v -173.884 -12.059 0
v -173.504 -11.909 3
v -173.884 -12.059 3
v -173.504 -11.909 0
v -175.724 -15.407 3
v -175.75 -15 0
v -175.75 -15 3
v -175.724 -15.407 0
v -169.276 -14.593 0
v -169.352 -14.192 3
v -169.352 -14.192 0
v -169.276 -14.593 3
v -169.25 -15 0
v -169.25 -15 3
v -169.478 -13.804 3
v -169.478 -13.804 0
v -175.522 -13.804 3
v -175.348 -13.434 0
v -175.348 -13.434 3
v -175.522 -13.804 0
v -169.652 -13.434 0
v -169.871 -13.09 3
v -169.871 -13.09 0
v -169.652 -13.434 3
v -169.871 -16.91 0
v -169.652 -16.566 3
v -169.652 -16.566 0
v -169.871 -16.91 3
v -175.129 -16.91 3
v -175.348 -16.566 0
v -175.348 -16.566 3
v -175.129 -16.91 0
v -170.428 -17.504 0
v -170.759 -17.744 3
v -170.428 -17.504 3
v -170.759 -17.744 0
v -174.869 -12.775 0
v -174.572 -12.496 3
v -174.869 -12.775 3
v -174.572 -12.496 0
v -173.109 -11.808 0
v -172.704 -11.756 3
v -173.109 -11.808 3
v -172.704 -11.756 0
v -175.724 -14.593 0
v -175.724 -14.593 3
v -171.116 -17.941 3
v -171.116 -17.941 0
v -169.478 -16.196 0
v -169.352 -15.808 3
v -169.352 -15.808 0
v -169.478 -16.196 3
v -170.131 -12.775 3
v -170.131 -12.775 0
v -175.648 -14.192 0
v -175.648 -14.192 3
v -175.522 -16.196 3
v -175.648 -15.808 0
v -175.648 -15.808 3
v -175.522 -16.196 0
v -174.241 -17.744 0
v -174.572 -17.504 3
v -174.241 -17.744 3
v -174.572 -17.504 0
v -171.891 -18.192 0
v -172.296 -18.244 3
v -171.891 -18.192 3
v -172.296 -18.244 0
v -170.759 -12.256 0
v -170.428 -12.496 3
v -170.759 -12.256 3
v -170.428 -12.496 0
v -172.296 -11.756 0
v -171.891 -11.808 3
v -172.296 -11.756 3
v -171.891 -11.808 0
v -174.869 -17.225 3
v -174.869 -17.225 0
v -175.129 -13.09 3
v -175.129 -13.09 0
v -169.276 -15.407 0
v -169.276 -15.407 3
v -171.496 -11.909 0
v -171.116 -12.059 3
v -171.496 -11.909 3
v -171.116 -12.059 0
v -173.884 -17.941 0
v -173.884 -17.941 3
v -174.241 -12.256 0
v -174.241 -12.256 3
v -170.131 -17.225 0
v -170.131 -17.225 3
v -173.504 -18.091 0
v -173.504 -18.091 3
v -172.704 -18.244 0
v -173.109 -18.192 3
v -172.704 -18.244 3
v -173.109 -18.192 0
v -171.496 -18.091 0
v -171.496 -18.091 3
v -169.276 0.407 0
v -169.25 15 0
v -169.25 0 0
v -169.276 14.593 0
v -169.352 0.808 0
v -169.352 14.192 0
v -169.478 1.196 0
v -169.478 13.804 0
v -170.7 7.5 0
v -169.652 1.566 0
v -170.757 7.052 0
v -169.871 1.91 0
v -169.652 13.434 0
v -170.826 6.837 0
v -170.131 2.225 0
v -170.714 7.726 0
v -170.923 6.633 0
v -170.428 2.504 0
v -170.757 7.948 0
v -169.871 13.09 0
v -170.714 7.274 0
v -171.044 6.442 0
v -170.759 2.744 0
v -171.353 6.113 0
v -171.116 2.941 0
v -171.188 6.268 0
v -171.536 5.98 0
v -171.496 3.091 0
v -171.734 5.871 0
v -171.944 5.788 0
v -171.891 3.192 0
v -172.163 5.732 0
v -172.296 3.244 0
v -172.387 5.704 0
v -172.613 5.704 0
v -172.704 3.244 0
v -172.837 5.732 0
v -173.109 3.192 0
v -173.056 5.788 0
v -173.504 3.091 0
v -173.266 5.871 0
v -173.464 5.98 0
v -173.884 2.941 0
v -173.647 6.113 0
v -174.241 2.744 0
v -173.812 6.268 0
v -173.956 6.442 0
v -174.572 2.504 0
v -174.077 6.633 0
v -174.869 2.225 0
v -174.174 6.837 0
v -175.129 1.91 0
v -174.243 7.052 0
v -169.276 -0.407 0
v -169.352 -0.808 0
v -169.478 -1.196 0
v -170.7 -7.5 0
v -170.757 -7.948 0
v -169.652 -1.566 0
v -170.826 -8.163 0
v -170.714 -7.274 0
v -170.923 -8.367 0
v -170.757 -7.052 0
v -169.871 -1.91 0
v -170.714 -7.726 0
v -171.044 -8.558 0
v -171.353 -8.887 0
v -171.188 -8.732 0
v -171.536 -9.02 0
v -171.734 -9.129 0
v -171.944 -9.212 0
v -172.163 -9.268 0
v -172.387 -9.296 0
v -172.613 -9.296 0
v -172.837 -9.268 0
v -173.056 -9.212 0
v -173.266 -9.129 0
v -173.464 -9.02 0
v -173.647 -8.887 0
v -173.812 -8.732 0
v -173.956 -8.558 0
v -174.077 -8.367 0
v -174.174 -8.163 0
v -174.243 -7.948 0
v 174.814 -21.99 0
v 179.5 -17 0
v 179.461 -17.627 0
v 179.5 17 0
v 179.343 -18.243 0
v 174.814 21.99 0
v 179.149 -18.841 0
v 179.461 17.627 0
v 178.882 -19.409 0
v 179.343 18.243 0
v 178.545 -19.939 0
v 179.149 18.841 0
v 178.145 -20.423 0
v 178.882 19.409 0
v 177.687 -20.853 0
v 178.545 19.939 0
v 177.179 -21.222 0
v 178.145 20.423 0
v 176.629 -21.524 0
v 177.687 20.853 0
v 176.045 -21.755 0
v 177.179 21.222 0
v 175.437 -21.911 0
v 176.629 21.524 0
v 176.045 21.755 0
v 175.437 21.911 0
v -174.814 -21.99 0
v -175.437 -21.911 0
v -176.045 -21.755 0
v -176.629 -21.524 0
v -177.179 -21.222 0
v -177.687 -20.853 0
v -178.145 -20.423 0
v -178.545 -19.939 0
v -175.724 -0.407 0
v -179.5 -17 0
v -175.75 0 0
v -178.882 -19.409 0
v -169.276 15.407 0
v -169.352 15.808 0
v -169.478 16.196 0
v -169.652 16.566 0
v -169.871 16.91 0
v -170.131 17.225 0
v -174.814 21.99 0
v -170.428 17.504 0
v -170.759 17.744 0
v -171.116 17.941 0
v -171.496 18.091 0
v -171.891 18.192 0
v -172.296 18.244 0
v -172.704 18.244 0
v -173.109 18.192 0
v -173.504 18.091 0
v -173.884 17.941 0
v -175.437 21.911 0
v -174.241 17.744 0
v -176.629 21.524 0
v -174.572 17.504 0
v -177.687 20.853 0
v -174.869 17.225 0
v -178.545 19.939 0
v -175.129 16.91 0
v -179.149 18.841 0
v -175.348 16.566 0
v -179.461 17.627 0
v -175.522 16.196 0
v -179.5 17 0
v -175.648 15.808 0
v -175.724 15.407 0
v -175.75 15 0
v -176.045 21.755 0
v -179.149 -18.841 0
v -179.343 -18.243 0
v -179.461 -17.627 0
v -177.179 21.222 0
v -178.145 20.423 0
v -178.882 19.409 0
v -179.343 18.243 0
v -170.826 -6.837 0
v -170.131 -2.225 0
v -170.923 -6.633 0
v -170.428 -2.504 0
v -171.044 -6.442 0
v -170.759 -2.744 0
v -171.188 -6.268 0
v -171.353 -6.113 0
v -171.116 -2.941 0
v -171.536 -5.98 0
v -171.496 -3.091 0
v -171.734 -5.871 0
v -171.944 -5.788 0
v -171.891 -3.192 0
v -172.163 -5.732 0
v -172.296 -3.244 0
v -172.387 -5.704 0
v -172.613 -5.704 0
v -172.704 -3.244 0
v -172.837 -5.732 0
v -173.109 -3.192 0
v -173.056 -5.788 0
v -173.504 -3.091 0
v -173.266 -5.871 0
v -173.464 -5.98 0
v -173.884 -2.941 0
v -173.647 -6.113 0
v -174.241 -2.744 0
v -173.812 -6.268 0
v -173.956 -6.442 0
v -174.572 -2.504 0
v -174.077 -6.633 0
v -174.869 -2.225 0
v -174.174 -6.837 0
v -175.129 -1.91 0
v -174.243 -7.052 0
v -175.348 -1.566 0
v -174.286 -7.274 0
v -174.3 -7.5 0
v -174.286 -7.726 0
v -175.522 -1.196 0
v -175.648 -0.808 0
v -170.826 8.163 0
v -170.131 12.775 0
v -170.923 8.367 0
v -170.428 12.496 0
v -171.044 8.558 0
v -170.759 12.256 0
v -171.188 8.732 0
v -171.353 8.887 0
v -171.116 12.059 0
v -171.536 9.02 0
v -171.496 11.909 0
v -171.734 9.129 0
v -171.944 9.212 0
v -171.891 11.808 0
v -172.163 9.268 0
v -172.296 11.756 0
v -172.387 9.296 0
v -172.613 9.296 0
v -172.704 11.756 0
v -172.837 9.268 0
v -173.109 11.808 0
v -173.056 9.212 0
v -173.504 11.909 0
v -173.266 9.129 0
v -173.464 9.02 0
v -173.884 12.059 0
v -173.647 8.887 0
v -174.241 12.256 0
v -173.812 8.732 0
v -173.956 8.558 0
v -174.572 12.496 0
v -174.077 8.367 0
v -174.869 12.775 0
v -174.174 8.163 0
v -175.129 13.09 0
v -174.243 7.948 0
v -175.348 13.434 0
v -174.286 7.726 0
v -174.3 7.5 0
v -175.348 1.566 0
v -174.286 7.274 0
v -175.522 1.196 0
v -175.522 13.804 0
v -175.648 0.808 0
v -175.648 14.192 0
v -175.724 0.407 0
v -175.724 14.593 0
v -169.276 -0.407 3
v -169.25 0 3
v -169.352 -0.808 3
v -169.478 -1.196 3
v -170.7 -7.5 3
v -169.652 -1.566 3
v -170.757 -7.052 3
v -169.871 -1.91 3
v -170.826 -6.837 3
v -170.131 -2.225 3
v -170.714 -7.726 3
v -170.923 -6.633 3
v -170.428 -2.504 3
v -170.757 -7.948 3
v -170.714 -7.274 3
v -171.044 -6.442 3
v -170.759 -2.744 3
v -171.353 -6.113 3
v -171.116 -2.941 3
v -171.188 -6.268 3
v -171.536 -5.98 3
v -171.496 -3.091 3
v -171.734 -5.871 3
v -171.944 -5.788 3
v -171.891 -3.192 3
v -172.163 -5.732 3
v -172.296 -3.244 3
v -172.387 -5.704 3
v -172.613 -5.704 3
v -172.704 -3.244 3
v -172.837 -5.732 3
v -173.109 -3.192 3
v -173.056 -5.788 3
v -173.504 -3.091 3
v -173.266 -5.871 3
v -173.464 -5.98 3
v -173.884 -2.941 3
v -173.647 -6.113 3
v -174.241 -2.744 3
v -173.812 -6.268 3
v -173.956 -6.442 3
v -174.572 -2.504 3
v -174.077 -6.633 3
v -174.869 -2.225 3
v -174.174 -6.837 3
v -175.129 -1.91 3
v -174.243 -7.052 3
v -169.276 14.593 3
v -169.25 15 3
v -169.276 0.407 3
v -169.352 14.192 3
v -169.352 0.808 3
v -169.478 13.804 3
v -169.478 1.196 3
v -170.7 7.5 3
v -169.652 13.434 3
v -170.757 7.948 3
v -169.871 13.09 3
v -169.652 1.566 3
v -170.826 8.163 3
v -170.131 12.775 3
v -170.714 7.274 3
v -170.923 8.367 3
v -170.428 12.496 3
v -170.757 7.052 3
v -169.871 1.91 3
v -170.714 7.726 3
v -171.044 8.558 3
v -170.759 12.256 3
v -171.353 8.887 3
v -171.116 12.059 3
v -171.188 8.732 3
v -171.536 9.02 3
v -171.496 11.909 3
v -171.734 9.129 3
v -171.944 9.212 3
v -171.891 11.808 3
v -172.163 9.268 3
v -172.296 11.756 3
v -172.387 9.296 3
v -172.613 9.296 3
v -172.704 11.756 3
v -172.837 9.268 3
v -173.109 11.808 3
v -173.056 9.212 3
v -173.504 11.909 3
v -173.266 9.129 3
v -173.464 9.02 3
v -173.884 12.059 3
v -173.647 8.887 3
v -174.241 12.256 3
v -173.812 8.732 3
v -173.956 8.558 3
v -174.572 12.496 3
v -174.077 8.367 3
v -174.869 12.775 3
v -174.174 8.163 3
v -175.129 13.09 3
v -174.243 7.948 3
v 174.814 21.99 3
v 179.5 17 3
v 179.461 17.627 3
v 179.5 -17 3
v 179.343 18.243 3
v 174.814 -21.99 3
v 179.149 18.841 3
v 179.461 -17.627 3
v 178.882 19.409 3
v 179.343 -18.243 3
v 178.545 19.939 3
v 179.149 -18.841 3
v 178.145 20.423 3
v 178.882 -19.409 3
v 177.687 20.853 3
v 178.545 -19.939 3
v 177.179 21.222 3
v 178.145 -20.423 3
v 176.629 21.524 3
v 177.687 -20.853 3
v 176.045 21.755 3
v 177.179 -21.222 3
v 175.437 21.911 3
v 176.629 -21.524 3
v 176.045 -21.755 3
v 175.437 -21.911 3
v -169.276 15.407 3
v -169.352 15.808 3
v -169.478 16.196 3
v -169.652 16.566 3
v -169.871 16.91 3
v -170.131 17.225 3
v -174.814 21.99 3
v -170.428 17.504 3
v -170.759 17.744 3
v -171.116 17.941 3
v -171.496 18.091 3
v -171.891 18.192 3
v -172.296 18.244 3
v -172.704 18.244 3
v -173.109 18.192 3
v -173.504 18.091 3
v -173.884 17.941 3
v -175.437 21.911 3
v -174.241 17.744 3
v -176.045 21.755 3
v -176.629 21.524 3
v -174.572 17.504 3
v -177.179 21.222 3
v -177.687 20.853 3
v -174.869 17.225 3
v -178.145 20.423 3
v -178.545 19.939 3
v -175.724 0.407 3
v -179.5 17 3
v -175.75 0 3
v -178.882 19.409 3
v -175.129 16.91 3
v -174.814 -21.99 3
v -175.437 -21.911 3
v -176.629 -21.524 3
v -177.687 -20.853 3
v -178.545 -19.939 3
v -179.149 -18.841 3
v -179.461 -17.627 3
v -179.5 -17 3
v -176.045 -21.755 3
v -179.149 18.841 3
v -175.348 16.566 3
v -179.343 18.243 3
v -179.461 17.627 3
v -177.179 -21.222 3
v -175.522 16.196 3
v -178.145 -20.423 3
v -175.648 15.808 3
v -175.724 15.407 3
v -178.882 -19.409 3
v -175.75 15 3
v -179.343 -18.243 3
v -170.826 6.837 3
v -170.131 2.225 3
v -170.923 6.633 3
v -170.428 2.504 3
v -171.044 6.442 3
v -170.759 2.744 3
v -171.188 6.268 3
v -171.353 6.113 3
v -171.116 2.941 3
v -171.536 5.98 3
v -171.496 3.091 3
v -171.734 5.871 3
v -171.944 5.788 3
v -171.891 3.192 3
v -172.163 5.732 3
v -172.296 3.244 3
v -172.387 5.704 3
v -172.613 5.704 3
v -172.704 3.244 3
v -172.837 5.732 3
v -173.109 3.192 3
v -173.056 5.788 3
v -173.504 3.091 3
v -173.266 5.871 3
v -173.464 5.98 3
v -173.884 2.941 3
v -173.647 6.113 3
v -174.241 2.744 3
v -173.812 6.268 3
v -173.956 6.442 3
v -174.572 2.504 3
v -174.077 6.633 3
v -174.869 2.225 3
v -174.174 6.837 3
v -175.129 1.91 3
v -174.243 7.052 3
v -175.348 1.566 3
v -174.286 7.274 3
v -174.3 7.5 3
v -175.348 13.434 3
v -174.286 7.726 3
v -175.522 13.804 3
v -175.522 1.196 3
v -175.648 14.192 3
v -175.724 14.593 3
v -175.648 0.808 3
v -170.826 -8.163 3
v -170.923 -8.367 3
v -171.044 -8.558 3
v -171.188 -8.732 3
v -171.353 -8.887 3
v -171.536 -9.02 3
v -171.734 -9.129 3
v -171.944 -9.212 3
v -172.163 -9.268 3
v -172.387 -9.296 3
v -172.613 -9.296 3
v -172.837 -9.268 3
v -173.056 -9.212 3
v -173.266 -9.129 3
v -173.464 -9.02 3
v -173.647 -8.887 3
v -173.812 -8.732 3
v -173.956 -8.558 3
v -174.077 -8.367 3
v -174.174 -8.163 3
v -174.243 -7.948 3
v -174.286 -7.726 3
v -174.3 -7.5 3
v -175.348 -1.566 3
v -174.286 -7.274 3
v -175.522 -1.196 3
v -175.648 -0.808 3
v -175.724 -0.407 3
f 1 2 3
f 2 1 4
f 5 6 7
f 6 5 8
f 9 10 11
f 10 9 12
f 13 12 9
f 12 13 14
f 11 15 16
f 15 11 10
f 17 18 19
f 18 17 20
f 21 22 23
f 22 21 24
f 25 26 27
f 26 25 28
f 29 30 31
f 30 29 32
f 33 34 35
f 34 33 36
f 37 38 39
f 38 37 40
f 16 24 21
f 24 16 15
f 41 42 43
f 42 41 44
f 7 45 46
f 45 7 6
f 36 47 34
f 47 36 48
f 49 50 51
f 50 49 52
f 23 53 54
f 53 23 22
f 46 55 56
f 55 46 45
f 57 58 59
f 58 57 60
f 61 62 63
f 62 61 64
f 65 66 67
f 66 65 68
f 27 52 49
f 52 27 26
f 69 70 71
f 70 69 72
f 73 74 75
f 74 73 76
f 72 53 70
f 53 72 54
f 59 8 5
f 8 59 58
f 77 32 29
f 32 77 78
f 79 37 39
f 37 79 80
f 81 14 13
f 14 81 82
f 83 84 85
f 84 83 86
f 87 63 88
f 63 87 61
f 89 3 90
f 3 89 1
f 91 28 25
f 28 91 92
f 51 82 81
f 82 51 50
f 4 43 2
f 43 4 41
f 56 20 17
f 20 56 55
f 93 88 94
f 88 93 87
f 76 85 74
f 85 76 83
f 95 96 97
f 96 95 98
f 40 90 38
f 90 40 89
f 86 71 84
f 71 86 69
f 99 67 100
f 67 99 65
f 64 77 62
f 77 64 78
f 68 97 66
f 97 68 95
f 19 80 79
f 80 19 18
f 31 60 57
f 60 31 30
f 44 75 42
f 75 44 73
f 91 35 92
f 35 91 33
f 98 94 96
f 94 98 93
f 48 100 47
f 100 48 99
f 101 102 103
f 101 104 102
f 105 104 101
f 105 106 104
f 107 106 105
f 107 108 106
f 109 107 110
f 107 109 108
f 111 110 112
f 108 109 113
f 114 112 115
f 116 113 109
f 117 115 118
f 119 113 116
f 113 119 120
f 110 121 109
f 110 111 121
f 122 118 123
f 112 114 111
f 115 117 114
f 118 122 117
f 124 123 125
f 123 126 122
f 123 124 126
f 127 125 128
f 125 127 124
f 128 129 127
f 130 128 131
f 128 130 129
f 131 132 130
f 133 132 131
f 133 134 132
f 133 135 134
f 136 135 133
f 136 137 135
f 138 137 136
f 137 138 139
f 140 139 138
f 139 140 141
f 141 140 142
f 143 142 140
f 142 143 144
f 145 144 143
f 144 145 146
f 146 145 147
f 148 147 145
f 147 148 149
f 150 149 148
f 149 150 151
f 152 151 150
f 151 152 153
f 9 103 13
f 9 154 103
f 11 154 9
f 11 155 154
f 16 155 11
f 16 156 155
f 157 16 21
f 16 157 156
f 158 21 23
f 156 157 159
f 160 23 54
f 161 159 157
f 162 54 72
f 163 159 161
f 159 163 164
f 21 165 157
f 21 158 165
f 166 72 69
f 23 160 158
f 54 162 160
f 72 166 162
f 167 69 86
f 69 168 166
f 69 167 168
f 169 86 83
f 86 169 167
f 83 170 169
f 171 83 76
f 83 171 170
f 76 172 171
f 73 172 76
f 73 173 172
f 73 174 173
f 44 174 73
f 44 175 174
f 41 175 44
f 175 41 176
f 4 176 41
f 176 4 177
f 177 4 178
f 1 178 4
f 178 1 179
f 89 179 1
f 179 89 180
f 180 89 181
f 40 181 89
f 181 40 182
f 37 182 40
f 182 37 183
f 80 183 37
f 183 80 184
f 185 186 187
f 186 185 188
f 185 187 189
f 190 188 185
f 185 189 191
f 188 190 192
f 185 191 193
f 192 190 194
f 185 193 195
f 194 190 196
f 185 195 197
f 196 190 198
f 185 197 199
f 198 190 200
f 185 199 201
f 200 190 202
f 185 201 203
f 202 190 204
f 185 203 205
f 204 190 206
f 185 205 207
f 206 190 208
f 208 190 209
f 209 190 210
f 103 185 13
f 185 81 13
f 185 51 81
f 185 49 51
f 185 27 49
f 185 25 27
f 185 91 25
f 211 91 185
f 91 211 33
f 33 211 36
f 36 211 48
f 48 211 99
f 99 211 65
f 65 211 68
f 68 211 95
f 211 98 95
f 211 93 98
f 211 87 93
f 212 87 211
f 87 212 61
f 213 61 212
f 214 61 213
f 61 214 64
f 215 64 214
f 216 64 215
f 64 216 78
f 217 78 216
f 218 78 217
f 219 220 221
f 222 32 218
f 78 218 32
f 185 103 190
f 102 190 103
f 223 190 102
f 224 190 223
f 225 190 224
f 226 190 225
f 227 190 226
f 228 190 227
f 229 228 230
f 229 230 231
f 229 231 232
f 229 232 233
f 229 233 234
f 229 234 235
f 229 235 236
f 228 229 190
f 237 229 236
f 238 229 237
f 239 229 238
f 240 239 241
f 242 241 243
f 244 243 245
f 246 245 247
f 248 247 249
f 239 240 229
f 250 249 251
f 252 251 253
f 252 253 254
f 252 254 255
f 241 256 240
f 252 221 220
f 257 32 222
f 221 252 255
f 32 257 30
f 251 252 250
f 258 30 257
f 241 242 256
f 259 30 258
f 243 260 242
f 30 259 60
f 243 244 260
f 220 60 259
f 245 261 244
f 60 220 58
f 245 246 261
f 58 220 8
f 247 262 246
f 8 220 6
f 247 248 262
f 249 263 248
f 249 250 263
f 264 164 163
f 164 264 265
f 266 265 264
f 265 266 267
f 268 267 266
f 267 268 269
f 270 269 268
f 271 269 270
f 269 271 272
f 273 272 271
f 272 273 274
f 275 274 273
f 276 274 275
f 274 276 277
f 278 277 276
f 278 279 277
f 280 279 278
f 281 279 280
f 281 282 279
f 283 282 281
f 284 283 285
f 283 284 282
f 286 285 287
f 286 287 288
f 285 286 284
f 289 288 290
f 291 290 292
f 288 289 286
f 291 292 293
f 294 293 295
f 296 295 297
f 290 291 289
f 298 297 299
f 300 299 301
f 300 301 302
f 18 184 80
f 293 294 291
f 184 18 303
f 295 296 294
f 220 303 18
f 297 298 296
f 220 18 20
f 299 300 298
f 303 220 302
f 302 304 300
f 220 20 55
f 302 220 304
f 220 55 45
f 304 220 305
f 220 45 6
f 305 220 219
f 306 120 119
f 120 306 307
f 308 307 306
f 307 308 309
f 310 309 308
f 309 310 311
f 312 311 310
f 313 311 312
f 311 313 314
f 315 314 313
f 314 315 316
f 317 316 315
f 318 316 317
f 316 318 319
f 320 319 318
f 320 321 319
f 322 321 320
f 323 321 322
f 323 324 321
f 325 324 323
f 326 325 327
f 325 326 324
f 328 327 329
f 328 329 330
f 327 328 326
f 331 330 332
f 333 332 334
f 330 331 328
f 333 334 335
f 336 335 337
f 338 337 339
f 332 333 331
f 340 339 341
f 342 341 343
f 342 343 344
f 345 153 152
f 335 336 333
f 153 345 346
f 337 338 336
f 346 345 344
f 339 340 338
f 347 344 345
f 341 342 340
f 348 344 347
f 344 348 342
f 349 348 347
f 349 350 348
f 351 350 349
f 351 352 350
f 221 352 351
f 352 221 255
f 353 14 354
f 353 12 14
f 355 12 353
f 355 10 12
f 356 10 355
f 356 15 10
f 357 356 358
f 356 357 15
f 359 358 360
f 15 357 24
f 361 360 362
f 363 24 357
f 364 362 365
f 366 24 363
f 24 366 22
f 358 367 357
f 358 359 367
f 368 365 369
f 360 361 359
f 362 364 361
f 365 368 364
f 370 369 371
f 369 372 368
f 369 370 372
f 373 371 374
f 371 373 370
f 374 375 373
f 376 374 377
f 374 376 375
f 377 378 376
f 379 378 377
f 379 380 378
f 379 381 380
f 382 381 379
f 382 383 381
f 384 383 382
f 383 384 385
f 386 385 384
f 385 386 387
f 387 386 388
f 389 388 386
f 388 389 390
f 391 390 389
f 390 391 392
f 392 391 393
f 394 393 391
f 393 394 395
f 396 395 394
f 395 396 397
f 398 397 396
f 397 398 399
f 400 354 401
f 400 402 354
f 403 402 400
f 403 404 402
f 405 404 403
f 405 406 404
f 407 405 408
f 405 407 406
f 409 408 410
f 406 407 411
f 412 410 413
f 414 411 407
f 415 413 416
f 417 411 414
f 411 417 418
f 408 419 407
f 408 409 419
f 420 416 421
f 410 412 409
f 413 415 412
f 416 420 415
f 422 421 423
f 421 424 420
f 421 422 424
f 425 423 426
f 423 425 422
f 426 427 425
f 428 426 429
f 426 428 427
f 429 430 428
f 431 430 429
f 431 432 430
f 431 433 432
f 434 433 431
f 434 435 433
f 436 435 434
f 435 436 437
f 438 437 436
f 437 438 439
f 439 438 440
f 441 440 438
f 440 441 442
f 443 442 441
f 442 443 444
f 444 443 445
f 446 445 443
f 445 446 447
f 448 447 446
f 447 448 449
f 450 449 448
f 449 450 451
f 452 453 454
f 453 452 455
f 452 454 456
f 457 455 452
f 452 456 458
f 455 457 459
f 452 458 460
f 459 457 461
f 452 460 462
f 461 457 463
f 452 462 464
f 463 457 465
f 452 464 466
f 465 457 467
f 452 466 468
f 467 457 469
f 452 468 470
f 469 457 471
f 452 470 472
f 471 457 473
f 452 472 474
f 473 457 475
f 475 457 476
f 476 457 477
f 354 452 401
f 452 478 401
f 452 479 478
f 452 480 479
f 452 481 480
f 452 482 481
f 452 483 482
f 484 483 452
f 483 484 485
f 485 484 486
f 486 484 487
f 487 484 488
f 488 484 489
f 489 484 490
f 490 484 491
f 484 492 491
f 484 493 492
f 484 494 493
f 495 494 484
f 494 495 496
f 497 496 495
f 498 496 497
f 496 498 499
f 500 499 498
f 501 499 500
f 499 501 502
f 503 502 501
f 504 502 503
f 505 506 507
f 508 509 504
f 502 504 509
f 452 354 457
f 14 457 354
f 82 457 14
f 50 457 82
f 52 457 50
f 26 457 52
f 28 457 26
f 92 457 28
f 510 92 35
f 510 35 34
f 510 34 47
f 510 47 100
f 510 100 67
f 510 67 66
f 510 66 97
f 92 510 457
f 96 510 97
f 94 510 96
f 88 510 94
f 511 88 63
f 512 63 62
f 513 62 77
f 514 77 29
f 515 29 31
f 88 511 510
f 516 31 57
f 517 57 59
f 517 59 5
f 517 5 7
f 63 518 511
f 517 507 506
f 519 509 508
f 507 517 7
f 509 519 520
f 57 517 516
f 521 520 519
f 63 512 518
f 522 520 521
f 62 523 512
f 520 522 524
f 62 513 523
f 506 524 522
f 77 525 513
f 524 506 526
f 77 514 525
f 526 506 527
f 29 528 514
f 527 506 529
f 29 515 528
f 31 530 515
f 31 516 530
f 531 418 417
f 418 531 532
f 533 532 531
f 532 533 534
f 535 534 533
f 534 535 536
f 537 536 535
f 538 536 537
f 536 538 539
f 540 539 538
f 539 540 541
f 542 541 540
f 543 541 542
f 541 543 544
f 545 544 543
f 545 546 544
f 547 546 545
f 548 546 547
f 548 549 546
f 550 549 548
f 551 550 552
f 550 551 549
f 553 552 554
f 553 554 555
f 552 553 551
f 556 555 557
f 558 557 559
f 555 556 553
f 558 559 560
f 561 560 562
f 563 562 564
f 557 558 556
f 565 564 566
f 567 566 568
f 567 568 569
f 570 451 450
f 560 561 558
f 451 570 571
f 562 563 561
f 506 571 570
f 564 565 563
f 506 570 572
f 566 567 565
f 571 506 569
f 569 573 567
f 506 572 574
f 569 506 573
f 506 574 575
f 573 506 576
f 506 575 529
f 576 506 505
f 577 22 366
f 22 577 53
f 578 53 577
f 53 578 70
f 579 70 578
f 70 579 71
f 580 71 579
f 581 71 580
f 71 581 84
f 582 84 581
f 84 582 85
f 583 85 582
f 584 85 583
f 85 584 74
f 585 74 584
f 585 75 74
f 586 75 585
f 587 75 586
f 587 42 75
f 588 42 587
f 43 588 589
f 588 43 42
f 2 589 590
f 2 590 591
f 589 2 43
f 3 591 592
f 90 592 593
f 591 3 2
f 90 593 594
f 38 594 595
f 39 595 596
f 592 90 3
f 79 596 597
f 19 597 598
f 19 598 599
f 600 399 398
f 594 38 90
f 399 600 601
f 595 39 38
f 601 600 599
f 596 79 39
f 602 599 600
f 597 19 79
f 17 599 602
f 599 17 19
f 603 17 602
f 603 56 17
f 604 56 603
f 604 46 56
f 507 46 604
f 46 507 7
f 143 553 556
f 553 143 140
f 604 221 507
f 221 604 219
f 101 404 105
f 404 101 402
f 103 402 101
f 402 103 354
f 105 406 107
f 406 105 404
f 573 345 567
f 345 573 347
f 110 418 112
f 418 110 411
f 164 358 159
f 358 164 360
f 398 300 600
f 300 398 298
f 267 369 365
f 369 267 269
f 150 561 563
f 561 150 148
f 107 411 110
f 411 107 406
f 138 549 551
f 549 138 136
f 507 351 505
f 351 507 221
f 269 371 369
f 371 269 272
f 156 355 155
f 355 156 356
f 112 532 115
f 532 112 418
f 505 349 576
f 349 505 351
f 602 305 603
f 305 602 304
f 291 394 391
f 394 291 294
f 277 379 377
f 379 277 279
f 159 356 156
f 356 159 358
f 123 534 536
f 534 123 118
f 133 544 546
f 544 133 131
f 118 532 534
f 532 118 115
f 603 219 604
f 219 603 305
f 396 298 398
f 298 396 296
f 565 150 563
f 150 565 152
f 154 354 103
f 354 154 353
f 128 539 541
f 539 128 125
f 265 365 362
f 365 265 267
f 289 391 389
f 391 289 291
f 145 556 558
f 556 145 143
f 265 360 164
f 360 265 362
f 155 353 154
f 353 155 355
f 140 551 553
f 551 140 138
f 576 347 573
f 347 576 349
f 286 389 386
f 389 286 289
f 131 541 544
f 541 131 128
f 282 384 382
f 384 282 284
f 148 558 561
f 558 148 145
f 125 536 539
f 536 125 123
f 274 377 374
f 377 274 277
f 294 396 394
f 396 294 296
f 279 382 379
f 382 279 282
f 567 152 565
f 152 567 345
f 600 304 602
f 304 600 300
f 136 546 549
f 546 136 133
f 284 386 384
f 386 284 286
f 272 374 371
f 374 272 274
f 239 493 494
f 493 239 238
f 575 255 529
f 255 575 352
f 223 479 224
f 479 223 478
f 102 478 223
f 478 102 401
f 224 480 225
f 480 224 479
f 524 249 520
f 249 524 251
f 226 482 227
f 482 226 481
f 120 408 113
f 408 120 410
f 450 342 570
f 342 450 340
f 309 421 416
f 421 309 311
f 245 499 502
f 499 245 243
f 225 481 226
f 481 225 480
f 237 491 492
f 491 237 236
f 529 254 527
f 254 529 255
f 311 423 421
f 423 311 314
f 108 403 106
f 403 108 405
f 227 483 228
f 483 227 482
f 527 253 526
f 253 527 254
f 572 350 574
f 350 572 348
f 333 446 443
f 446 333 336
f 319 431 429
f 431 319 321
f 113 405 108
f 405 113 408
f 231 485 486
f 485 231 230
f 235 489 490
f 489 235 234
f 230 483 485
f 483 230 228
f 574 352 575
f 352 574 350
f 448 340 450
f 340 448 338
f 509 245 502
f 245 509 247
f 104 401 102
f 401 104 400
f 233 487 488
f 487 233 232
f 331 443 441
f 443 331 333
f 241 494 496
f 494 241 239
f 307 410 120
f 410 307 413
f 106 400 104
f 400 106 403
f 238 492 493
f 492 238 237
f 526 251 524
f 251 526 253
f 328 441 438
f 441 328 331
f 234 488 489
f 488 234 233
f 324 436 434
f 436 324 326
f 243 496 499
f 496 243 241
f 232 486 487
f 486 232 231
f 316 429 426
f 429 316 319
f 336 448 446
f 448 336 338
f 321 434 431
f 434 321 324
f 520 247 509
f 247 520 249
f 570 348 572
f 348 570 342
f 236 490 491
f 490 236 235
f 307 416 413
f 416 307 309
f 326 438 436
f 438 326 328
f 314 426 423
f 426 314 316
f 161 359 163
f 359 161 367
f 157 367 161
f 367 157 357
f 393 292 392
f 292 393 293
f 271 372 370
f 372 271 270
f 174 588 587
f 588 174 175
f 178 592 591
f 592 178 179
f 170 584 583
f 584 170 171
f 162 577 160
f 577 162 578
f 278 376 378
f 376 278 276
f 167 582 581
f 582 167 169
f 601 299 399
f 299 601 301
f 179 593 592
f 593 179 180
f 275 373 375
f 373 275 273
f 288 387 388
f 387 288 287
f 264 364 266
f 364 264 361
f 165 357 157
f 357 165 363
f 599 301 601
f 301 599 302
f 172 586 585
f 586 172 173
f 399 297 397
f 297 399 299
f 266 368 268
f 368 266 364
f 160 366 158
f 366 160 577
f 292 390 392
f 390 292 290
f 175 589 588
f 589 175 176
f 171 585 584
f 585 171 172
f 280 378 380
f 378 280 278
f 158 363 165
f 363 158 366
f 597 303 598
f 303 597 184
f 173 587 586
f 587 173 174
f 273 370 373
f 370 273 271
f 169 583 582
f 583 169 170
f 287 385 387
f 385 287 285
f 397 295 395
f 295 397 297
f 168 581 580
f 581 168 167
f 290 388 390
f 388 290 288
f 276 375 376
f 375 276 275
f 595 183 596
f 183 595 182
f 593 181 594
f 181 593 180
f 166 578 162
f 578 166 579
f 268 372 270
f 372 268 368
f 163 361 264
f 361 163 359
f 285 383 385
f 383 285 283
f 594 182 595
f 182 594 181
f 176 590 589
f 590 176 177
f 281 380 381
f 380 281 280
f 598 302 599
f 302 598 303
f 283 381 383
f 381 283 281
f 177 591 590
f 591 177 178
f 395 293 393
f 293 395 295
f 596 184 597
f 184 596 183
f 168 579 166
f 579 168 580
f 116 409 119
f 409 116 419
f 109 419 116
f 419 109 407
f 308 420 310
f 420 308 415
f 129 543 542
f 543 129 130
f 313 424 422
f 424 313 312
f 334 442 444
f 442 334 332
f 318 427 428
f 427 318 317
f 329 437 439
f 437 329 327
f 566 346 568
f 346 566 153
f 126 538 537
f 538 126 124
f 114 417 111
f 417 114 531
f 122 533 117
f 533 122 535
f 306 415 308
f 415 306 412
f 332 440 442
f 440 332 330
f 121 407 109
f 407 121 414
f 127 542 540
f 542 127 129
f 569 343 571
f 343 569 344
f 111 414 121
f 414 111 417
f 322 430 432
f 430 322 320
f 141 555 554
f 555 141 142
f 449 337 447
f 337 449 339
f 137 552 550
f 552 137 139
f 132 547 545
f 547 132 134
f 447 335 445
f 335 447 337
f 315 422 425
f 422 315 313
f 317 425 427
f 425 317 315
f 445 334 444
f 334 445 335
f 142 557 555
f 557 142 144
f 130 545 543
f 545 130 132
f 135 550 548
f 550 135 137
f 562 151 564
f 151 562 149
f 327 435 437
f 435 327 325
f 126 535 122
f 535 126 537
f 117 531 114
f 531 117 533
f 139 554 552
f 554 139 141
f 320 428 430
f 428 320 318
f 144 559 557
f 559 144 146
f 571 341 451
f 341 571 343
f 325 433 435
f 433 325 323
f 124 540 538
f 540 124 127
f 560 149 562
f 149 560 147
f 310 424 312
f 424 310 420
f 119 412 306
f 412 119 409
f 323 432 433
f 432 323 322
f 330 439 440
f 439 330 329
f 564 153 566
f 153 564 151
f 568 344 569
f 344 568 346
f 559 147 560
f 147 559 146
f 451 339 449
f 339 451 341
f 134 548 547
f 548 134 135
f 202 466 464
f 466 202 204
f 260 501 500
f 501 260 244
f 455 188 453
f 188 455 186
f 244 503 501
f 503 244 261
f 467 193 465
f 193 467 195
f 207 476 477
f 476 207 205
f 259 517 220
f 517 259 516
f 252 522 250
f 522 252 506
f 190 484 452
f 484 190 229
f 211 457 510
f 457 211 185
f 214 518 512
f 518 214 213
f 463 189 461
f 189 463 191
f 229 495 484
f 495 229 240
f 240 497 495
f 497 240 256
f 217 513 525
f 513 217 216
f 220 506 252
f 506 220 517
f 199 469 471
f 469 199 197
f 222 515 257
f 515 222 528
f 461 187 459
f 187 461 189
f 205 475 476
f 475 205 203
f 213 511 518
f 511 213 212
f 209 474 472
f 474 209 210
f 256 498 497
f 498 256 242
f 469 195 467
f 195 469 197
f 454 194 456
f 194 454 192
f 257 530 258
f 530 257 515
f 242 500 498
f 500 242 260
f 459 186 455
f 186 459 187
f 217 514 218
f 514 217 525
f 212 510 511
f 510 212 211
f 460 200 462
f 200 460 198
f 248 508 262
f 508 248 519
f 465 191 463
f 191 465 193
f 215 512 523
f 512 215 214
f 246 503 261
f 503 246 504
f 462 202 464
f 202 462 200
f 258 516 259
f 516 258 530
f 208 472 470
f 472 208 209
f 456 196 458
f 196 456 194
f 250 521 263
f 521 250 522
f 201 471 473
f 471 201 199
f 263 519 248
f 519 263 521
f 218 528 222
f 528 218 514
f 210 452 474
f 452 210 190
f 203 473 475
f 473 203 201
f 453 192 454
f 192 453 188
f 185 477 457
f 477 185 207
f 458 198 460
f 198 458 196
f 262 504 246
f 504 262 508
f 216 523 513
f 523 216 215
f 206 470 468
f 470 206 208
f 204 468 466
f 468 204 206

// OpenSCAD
$fn = 50;


difference() {
	union() {
		hull() {
			translate(v = [-174.5000000000, 17.0000000000, 0]) {
				cylinder(h = 3, r = 5);
			}
			translate(v = [174.5000000000, 17.0000000000, 0]) {
				cylinder(h = 3, r = 5);
			}
			translate(v = [-174.5000000000, -17.0000000000, 0]) {
				cylinder(h = 3, r = 5);
			}
			translate(v = [174.5000000000, -17.0000000000, 0]) {
				cylinder(h = 3, r = 5);
			}
		}
	}
	union() {
		translate(v = [-172.5000000000, -15.0000000000, 0]) {
			cylinder(h = 3, r = 3.2500000000);
		}
		translate(v = [-172.5000000000, 0.0000000000, 0]) {
			cylinder(h = 3, r = 3.2500000000);
		}
		translate(v = [-172.5000000000, 15.0000000000, 0]) {
			cylinder(h = 3, r = 3.2500000000);
		}
		translate(v = [-172.5000000000, -15.0000000000, 0]) {
			cylinder(h = 3, r = 1.8000000000);
		}
		translate(v = [-172.5000000000, -7.5000000000, 0]) {
			cylinder(h = 3, r = 1.8000000000);
		}
		translate(v = [-172.5000000000, 0.0000000000, 0]) {
			cylinder(h = 3, r = 1.8000000000);
		}
		translate(v = [-172.5000000000, 7.5000000000, 0]) {
			cylinder(h = 3, r = 1.8000000000);
		}
		translate(v = [-172.5000000000, 15.0000000000, 0]) {
			cylinder(h = 3, r = 1.8000000000);
		}
		translate(v = [-172.5000000000, -15.0000000000, 0]) {
			cylinder(h = 3, r = 1.8000000000);
		}
		translate(v = [-172.5000000000, -7.5000000000, 0]) {
			cylinder(h = 3, r = 1.8000000000);
		}
		translate(v = [-172.5000000000, 0.0000000000, 0]) {
			cylinder(h = 3, r = 1.8000000000);
		}
		translate(v = [-172.5000000000, 7.5000000000, 0]) {
			cylinder(h = 3, r = 1.8000000000);
		}
		translate(v = [-172.5000000000, 15.0000000000, 0]) {
			cylinder(h = 3, r = 1.8000000000);
		}
		translate(v = [-172.5000000000, -15.0000000000, 0]) {
			cylinder(h = 3, r = 1.8000000000);
		}
		translate(v = [-172.5000000000, -7.5000000000, 0]) {
			cylinder(h = 3, r = 1.8000000000);
		}
		translate(v = [-172.5000000000, 0.0000000000, 0]) {
			cylinder(h = 3, r = 1.8000000000);
		}
		translate(v = [-172.5000000000, 7.5000000000, 0]) {
			cylinder(h = 3, r = 1.8000000000);
		}
		translate(v = [-172.5000000000, 15.0000000000, 0]) {
			cylinder(h = 3, r = 1.8000000000);
		}
	}
}
